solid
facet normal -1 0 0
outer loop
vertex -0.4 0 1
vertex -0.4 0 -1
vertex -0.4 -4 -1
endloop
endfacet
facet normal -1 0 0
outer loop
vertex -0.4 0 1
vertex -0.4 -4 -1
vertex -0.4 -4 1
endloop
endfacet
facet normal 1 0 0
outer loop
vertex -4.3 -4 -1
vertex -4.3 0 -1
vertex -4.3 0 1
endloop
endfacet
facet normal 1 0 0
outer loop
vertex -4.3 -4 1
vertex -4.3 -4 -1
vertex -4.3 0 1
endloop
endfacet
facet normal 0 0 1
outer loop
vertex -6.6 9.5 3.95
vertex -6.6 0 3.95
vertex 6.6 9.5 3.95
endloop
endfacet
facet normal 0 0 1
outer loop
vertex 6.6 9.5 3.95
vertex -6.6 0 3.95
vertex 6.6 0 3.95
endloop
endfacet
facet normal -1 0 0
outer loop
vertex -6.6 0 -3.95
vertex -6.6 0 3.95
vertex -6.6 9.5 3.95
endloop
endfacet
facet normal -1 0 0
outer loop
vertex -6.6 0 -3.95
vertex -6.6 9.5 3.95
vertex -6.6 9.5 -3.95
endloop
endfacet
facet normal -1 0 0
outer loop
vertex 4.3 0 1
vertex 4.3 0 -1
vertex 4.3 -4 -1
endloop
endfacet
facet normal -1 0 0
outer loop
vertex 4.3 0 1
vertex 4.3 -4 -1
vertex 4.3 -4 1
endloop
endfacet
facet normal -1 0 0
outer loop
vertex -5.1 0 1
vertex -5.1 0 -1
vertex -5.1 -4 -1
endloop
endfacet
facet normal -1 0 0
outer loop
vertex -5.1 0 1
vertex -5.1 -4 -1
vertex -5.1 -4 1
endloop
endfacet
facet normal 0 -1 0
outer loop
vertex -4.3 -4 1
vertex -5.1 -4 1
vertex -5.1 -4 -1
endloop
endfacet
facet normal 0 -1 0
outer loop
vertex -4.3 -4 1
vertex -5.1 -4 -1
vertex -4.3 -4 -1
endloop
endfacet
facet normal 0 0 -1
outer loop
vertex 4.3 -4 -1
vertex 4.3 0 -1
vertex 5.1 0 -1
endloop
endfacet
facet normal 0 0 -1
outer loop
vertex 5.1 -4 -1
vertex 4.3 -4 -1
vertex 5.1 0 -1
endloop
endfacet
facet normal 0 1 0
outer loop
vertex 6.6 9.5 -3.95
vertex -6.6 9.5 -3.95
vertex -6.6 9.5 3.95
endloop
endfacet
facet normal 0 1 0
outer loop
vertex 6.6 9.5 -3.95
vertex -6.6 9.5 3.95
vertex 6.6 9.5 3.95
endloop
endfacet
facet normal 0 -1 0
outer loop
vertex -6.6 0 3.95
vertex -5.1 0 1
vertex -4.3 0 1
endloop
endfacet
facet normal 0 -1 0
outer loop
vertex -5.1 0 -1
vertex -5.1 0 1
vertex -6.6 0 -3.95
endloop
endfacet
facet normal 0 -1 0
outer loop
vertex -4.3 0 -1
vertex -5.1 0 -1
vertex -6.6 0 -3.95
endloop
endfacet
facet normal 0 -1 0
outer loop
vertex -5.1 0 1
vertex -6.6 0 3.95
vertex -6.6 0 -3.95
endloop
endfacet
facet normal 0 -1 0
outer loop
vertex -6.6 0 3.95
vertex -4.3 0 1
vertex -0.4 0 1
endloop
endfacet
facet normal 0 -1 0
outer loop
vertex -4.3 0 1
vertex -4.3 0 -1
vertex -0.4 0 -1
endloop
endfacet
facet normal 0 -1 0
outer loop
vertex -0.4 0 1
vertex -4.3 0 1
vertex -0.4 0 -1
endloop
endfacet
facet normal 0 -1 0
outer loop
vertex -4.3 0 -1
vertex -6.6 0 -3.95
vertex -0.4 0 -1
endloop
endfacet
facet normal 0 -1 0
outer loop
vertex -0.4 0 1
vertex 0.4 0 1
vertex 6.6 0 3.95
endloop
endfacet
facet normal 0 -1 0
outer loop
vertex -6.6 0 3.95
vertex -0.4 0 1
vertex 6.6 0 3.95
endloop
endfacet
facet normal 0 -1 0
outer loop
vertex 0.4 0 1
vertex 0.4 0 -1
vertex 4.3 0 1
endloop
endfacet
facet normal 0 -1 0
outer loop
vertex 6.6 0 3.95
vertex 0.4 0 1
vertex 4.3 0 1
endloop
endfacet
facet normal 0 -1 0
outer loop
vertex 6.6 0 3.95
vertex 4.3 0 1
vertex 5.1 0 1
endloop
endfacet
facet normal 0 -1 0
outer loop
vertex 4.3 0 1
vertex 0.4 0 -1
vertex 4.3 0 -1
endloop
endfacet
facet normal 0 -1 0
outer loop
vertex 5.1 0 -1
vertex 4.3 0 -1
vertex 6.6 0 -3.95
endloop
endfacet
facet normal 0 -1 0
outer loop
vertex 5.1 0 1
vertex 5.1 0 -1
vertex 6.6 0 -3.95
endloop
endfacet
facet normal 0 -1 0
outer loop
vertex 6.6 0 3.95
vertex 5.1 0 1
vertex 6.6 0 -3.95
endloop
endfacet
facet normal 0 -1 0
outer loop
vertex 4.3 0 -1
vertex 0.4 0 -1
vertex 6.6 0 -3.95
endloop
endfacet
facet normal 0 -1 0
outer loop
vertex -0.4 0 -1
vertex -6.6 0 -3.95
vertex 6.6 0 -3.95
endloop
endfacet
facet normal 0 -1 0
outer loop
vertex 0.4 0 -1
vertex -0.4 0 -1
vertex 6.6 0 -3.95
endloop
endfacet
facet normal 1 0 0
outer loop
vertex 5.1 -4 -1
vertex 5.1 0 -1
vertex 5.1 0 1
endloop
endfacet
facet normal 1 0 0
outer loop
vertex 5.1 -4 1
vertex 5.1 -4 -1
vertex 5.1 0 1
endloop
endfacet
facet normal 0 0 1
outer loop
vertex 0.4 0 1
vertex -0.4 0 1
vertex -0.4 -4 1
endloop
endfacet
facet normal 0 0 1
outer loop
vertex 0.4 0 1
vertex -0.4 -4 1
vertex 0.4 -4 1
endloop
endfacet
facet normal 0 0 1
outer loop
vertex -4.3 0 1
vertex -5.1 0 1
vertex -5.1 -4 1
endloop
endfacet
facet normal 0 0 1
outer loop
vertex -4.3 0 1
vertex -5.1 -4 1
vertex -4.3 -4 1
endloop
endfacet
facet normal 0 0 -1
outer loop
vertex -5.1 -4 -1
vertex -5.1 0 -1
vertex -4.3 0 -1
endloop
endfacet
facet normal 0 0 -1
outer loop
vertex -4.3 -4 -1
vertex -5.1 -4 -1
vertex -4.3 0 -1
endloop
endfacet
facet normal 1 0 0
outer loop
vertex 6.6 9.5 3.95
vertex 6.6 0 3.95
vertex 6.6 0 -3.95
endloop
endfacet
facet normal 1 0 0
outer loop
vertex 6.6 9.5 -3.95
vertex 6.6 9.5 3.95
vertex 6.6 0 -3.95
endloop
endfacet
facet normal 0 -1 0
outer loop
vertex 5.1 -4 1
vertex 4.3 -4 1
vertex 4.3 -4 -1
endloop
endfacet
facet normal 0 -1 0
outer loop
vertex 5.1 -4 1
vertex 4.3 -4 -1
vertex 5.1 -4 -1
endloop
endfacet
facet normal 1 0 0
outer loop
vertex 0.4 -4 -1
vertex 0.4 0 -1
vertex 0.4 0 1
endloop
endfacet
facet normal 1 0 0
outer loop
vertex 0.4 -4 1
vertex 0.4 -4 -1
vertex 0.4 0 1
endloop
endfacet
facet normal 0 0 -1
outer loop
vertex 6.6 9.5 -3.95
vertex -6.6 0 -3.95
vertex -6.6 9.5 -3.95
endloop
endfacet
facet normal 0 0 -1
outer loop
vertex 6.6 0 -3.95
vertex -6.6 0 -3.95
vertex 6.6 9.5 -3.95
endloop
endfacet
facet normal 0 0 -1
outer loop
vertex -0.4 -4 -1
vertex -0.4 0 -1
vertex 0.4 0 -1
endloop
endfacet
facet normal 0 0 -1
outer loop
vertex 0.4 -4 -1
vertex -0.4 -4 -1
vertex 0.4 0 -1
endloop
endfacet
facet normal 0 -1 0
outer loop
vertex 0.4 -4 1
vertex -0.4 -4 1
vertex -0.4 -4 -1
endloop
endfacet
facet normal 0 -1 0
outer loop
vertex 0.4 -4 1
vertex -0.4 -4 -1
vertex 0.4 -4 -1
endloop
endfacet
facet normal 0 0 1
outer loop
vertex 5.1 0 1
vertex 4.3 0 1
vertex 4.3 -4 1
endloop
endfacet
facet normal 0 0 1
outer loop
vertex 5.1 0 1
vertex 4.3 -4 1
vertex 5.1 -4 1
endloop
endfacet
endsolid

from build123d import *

# Parameters (mm, degrees)
SKETCH1_W           = 13.2
SKETCH1_H           = 7.9
BOSS_EXTRUDE1_DEPTH = 9.5
SKETCH2_W           = 0.8
SKETCH2_H           = 2
BOSS_EXTRUDE2_DEPTH = 4


with BuildPart() as part:
    # Sketch1 → Boss-Extrude1 (new body)
    with BuildSketch(Plane(origin=(0, 0, 0), x_dir=(1, 0, 0), z_dir=(0, 1, 0))):
        Rectangle(SKETCH1_W, SKETCH1_H)
    extrude(amount=BOSS_EXTRUDE1_DEPTH)

    # Sketch2 → Boss-Extrude2 (add)
    with BuildSketch(Plane.XZ):
        Rectangle(SKETCH2_W, SKETCH2_H)
        with Locations((4.7, 0)):
            Rectangle(SKETCH2_W, SKETCH2_H)
        with Locations((-4.7, 0)):
            Rectangle(SKETCH2_W, SKETCH2_H)
    extrude(amount=BOSS_EXTRUDE2_DEPTH)


solid = part.part
